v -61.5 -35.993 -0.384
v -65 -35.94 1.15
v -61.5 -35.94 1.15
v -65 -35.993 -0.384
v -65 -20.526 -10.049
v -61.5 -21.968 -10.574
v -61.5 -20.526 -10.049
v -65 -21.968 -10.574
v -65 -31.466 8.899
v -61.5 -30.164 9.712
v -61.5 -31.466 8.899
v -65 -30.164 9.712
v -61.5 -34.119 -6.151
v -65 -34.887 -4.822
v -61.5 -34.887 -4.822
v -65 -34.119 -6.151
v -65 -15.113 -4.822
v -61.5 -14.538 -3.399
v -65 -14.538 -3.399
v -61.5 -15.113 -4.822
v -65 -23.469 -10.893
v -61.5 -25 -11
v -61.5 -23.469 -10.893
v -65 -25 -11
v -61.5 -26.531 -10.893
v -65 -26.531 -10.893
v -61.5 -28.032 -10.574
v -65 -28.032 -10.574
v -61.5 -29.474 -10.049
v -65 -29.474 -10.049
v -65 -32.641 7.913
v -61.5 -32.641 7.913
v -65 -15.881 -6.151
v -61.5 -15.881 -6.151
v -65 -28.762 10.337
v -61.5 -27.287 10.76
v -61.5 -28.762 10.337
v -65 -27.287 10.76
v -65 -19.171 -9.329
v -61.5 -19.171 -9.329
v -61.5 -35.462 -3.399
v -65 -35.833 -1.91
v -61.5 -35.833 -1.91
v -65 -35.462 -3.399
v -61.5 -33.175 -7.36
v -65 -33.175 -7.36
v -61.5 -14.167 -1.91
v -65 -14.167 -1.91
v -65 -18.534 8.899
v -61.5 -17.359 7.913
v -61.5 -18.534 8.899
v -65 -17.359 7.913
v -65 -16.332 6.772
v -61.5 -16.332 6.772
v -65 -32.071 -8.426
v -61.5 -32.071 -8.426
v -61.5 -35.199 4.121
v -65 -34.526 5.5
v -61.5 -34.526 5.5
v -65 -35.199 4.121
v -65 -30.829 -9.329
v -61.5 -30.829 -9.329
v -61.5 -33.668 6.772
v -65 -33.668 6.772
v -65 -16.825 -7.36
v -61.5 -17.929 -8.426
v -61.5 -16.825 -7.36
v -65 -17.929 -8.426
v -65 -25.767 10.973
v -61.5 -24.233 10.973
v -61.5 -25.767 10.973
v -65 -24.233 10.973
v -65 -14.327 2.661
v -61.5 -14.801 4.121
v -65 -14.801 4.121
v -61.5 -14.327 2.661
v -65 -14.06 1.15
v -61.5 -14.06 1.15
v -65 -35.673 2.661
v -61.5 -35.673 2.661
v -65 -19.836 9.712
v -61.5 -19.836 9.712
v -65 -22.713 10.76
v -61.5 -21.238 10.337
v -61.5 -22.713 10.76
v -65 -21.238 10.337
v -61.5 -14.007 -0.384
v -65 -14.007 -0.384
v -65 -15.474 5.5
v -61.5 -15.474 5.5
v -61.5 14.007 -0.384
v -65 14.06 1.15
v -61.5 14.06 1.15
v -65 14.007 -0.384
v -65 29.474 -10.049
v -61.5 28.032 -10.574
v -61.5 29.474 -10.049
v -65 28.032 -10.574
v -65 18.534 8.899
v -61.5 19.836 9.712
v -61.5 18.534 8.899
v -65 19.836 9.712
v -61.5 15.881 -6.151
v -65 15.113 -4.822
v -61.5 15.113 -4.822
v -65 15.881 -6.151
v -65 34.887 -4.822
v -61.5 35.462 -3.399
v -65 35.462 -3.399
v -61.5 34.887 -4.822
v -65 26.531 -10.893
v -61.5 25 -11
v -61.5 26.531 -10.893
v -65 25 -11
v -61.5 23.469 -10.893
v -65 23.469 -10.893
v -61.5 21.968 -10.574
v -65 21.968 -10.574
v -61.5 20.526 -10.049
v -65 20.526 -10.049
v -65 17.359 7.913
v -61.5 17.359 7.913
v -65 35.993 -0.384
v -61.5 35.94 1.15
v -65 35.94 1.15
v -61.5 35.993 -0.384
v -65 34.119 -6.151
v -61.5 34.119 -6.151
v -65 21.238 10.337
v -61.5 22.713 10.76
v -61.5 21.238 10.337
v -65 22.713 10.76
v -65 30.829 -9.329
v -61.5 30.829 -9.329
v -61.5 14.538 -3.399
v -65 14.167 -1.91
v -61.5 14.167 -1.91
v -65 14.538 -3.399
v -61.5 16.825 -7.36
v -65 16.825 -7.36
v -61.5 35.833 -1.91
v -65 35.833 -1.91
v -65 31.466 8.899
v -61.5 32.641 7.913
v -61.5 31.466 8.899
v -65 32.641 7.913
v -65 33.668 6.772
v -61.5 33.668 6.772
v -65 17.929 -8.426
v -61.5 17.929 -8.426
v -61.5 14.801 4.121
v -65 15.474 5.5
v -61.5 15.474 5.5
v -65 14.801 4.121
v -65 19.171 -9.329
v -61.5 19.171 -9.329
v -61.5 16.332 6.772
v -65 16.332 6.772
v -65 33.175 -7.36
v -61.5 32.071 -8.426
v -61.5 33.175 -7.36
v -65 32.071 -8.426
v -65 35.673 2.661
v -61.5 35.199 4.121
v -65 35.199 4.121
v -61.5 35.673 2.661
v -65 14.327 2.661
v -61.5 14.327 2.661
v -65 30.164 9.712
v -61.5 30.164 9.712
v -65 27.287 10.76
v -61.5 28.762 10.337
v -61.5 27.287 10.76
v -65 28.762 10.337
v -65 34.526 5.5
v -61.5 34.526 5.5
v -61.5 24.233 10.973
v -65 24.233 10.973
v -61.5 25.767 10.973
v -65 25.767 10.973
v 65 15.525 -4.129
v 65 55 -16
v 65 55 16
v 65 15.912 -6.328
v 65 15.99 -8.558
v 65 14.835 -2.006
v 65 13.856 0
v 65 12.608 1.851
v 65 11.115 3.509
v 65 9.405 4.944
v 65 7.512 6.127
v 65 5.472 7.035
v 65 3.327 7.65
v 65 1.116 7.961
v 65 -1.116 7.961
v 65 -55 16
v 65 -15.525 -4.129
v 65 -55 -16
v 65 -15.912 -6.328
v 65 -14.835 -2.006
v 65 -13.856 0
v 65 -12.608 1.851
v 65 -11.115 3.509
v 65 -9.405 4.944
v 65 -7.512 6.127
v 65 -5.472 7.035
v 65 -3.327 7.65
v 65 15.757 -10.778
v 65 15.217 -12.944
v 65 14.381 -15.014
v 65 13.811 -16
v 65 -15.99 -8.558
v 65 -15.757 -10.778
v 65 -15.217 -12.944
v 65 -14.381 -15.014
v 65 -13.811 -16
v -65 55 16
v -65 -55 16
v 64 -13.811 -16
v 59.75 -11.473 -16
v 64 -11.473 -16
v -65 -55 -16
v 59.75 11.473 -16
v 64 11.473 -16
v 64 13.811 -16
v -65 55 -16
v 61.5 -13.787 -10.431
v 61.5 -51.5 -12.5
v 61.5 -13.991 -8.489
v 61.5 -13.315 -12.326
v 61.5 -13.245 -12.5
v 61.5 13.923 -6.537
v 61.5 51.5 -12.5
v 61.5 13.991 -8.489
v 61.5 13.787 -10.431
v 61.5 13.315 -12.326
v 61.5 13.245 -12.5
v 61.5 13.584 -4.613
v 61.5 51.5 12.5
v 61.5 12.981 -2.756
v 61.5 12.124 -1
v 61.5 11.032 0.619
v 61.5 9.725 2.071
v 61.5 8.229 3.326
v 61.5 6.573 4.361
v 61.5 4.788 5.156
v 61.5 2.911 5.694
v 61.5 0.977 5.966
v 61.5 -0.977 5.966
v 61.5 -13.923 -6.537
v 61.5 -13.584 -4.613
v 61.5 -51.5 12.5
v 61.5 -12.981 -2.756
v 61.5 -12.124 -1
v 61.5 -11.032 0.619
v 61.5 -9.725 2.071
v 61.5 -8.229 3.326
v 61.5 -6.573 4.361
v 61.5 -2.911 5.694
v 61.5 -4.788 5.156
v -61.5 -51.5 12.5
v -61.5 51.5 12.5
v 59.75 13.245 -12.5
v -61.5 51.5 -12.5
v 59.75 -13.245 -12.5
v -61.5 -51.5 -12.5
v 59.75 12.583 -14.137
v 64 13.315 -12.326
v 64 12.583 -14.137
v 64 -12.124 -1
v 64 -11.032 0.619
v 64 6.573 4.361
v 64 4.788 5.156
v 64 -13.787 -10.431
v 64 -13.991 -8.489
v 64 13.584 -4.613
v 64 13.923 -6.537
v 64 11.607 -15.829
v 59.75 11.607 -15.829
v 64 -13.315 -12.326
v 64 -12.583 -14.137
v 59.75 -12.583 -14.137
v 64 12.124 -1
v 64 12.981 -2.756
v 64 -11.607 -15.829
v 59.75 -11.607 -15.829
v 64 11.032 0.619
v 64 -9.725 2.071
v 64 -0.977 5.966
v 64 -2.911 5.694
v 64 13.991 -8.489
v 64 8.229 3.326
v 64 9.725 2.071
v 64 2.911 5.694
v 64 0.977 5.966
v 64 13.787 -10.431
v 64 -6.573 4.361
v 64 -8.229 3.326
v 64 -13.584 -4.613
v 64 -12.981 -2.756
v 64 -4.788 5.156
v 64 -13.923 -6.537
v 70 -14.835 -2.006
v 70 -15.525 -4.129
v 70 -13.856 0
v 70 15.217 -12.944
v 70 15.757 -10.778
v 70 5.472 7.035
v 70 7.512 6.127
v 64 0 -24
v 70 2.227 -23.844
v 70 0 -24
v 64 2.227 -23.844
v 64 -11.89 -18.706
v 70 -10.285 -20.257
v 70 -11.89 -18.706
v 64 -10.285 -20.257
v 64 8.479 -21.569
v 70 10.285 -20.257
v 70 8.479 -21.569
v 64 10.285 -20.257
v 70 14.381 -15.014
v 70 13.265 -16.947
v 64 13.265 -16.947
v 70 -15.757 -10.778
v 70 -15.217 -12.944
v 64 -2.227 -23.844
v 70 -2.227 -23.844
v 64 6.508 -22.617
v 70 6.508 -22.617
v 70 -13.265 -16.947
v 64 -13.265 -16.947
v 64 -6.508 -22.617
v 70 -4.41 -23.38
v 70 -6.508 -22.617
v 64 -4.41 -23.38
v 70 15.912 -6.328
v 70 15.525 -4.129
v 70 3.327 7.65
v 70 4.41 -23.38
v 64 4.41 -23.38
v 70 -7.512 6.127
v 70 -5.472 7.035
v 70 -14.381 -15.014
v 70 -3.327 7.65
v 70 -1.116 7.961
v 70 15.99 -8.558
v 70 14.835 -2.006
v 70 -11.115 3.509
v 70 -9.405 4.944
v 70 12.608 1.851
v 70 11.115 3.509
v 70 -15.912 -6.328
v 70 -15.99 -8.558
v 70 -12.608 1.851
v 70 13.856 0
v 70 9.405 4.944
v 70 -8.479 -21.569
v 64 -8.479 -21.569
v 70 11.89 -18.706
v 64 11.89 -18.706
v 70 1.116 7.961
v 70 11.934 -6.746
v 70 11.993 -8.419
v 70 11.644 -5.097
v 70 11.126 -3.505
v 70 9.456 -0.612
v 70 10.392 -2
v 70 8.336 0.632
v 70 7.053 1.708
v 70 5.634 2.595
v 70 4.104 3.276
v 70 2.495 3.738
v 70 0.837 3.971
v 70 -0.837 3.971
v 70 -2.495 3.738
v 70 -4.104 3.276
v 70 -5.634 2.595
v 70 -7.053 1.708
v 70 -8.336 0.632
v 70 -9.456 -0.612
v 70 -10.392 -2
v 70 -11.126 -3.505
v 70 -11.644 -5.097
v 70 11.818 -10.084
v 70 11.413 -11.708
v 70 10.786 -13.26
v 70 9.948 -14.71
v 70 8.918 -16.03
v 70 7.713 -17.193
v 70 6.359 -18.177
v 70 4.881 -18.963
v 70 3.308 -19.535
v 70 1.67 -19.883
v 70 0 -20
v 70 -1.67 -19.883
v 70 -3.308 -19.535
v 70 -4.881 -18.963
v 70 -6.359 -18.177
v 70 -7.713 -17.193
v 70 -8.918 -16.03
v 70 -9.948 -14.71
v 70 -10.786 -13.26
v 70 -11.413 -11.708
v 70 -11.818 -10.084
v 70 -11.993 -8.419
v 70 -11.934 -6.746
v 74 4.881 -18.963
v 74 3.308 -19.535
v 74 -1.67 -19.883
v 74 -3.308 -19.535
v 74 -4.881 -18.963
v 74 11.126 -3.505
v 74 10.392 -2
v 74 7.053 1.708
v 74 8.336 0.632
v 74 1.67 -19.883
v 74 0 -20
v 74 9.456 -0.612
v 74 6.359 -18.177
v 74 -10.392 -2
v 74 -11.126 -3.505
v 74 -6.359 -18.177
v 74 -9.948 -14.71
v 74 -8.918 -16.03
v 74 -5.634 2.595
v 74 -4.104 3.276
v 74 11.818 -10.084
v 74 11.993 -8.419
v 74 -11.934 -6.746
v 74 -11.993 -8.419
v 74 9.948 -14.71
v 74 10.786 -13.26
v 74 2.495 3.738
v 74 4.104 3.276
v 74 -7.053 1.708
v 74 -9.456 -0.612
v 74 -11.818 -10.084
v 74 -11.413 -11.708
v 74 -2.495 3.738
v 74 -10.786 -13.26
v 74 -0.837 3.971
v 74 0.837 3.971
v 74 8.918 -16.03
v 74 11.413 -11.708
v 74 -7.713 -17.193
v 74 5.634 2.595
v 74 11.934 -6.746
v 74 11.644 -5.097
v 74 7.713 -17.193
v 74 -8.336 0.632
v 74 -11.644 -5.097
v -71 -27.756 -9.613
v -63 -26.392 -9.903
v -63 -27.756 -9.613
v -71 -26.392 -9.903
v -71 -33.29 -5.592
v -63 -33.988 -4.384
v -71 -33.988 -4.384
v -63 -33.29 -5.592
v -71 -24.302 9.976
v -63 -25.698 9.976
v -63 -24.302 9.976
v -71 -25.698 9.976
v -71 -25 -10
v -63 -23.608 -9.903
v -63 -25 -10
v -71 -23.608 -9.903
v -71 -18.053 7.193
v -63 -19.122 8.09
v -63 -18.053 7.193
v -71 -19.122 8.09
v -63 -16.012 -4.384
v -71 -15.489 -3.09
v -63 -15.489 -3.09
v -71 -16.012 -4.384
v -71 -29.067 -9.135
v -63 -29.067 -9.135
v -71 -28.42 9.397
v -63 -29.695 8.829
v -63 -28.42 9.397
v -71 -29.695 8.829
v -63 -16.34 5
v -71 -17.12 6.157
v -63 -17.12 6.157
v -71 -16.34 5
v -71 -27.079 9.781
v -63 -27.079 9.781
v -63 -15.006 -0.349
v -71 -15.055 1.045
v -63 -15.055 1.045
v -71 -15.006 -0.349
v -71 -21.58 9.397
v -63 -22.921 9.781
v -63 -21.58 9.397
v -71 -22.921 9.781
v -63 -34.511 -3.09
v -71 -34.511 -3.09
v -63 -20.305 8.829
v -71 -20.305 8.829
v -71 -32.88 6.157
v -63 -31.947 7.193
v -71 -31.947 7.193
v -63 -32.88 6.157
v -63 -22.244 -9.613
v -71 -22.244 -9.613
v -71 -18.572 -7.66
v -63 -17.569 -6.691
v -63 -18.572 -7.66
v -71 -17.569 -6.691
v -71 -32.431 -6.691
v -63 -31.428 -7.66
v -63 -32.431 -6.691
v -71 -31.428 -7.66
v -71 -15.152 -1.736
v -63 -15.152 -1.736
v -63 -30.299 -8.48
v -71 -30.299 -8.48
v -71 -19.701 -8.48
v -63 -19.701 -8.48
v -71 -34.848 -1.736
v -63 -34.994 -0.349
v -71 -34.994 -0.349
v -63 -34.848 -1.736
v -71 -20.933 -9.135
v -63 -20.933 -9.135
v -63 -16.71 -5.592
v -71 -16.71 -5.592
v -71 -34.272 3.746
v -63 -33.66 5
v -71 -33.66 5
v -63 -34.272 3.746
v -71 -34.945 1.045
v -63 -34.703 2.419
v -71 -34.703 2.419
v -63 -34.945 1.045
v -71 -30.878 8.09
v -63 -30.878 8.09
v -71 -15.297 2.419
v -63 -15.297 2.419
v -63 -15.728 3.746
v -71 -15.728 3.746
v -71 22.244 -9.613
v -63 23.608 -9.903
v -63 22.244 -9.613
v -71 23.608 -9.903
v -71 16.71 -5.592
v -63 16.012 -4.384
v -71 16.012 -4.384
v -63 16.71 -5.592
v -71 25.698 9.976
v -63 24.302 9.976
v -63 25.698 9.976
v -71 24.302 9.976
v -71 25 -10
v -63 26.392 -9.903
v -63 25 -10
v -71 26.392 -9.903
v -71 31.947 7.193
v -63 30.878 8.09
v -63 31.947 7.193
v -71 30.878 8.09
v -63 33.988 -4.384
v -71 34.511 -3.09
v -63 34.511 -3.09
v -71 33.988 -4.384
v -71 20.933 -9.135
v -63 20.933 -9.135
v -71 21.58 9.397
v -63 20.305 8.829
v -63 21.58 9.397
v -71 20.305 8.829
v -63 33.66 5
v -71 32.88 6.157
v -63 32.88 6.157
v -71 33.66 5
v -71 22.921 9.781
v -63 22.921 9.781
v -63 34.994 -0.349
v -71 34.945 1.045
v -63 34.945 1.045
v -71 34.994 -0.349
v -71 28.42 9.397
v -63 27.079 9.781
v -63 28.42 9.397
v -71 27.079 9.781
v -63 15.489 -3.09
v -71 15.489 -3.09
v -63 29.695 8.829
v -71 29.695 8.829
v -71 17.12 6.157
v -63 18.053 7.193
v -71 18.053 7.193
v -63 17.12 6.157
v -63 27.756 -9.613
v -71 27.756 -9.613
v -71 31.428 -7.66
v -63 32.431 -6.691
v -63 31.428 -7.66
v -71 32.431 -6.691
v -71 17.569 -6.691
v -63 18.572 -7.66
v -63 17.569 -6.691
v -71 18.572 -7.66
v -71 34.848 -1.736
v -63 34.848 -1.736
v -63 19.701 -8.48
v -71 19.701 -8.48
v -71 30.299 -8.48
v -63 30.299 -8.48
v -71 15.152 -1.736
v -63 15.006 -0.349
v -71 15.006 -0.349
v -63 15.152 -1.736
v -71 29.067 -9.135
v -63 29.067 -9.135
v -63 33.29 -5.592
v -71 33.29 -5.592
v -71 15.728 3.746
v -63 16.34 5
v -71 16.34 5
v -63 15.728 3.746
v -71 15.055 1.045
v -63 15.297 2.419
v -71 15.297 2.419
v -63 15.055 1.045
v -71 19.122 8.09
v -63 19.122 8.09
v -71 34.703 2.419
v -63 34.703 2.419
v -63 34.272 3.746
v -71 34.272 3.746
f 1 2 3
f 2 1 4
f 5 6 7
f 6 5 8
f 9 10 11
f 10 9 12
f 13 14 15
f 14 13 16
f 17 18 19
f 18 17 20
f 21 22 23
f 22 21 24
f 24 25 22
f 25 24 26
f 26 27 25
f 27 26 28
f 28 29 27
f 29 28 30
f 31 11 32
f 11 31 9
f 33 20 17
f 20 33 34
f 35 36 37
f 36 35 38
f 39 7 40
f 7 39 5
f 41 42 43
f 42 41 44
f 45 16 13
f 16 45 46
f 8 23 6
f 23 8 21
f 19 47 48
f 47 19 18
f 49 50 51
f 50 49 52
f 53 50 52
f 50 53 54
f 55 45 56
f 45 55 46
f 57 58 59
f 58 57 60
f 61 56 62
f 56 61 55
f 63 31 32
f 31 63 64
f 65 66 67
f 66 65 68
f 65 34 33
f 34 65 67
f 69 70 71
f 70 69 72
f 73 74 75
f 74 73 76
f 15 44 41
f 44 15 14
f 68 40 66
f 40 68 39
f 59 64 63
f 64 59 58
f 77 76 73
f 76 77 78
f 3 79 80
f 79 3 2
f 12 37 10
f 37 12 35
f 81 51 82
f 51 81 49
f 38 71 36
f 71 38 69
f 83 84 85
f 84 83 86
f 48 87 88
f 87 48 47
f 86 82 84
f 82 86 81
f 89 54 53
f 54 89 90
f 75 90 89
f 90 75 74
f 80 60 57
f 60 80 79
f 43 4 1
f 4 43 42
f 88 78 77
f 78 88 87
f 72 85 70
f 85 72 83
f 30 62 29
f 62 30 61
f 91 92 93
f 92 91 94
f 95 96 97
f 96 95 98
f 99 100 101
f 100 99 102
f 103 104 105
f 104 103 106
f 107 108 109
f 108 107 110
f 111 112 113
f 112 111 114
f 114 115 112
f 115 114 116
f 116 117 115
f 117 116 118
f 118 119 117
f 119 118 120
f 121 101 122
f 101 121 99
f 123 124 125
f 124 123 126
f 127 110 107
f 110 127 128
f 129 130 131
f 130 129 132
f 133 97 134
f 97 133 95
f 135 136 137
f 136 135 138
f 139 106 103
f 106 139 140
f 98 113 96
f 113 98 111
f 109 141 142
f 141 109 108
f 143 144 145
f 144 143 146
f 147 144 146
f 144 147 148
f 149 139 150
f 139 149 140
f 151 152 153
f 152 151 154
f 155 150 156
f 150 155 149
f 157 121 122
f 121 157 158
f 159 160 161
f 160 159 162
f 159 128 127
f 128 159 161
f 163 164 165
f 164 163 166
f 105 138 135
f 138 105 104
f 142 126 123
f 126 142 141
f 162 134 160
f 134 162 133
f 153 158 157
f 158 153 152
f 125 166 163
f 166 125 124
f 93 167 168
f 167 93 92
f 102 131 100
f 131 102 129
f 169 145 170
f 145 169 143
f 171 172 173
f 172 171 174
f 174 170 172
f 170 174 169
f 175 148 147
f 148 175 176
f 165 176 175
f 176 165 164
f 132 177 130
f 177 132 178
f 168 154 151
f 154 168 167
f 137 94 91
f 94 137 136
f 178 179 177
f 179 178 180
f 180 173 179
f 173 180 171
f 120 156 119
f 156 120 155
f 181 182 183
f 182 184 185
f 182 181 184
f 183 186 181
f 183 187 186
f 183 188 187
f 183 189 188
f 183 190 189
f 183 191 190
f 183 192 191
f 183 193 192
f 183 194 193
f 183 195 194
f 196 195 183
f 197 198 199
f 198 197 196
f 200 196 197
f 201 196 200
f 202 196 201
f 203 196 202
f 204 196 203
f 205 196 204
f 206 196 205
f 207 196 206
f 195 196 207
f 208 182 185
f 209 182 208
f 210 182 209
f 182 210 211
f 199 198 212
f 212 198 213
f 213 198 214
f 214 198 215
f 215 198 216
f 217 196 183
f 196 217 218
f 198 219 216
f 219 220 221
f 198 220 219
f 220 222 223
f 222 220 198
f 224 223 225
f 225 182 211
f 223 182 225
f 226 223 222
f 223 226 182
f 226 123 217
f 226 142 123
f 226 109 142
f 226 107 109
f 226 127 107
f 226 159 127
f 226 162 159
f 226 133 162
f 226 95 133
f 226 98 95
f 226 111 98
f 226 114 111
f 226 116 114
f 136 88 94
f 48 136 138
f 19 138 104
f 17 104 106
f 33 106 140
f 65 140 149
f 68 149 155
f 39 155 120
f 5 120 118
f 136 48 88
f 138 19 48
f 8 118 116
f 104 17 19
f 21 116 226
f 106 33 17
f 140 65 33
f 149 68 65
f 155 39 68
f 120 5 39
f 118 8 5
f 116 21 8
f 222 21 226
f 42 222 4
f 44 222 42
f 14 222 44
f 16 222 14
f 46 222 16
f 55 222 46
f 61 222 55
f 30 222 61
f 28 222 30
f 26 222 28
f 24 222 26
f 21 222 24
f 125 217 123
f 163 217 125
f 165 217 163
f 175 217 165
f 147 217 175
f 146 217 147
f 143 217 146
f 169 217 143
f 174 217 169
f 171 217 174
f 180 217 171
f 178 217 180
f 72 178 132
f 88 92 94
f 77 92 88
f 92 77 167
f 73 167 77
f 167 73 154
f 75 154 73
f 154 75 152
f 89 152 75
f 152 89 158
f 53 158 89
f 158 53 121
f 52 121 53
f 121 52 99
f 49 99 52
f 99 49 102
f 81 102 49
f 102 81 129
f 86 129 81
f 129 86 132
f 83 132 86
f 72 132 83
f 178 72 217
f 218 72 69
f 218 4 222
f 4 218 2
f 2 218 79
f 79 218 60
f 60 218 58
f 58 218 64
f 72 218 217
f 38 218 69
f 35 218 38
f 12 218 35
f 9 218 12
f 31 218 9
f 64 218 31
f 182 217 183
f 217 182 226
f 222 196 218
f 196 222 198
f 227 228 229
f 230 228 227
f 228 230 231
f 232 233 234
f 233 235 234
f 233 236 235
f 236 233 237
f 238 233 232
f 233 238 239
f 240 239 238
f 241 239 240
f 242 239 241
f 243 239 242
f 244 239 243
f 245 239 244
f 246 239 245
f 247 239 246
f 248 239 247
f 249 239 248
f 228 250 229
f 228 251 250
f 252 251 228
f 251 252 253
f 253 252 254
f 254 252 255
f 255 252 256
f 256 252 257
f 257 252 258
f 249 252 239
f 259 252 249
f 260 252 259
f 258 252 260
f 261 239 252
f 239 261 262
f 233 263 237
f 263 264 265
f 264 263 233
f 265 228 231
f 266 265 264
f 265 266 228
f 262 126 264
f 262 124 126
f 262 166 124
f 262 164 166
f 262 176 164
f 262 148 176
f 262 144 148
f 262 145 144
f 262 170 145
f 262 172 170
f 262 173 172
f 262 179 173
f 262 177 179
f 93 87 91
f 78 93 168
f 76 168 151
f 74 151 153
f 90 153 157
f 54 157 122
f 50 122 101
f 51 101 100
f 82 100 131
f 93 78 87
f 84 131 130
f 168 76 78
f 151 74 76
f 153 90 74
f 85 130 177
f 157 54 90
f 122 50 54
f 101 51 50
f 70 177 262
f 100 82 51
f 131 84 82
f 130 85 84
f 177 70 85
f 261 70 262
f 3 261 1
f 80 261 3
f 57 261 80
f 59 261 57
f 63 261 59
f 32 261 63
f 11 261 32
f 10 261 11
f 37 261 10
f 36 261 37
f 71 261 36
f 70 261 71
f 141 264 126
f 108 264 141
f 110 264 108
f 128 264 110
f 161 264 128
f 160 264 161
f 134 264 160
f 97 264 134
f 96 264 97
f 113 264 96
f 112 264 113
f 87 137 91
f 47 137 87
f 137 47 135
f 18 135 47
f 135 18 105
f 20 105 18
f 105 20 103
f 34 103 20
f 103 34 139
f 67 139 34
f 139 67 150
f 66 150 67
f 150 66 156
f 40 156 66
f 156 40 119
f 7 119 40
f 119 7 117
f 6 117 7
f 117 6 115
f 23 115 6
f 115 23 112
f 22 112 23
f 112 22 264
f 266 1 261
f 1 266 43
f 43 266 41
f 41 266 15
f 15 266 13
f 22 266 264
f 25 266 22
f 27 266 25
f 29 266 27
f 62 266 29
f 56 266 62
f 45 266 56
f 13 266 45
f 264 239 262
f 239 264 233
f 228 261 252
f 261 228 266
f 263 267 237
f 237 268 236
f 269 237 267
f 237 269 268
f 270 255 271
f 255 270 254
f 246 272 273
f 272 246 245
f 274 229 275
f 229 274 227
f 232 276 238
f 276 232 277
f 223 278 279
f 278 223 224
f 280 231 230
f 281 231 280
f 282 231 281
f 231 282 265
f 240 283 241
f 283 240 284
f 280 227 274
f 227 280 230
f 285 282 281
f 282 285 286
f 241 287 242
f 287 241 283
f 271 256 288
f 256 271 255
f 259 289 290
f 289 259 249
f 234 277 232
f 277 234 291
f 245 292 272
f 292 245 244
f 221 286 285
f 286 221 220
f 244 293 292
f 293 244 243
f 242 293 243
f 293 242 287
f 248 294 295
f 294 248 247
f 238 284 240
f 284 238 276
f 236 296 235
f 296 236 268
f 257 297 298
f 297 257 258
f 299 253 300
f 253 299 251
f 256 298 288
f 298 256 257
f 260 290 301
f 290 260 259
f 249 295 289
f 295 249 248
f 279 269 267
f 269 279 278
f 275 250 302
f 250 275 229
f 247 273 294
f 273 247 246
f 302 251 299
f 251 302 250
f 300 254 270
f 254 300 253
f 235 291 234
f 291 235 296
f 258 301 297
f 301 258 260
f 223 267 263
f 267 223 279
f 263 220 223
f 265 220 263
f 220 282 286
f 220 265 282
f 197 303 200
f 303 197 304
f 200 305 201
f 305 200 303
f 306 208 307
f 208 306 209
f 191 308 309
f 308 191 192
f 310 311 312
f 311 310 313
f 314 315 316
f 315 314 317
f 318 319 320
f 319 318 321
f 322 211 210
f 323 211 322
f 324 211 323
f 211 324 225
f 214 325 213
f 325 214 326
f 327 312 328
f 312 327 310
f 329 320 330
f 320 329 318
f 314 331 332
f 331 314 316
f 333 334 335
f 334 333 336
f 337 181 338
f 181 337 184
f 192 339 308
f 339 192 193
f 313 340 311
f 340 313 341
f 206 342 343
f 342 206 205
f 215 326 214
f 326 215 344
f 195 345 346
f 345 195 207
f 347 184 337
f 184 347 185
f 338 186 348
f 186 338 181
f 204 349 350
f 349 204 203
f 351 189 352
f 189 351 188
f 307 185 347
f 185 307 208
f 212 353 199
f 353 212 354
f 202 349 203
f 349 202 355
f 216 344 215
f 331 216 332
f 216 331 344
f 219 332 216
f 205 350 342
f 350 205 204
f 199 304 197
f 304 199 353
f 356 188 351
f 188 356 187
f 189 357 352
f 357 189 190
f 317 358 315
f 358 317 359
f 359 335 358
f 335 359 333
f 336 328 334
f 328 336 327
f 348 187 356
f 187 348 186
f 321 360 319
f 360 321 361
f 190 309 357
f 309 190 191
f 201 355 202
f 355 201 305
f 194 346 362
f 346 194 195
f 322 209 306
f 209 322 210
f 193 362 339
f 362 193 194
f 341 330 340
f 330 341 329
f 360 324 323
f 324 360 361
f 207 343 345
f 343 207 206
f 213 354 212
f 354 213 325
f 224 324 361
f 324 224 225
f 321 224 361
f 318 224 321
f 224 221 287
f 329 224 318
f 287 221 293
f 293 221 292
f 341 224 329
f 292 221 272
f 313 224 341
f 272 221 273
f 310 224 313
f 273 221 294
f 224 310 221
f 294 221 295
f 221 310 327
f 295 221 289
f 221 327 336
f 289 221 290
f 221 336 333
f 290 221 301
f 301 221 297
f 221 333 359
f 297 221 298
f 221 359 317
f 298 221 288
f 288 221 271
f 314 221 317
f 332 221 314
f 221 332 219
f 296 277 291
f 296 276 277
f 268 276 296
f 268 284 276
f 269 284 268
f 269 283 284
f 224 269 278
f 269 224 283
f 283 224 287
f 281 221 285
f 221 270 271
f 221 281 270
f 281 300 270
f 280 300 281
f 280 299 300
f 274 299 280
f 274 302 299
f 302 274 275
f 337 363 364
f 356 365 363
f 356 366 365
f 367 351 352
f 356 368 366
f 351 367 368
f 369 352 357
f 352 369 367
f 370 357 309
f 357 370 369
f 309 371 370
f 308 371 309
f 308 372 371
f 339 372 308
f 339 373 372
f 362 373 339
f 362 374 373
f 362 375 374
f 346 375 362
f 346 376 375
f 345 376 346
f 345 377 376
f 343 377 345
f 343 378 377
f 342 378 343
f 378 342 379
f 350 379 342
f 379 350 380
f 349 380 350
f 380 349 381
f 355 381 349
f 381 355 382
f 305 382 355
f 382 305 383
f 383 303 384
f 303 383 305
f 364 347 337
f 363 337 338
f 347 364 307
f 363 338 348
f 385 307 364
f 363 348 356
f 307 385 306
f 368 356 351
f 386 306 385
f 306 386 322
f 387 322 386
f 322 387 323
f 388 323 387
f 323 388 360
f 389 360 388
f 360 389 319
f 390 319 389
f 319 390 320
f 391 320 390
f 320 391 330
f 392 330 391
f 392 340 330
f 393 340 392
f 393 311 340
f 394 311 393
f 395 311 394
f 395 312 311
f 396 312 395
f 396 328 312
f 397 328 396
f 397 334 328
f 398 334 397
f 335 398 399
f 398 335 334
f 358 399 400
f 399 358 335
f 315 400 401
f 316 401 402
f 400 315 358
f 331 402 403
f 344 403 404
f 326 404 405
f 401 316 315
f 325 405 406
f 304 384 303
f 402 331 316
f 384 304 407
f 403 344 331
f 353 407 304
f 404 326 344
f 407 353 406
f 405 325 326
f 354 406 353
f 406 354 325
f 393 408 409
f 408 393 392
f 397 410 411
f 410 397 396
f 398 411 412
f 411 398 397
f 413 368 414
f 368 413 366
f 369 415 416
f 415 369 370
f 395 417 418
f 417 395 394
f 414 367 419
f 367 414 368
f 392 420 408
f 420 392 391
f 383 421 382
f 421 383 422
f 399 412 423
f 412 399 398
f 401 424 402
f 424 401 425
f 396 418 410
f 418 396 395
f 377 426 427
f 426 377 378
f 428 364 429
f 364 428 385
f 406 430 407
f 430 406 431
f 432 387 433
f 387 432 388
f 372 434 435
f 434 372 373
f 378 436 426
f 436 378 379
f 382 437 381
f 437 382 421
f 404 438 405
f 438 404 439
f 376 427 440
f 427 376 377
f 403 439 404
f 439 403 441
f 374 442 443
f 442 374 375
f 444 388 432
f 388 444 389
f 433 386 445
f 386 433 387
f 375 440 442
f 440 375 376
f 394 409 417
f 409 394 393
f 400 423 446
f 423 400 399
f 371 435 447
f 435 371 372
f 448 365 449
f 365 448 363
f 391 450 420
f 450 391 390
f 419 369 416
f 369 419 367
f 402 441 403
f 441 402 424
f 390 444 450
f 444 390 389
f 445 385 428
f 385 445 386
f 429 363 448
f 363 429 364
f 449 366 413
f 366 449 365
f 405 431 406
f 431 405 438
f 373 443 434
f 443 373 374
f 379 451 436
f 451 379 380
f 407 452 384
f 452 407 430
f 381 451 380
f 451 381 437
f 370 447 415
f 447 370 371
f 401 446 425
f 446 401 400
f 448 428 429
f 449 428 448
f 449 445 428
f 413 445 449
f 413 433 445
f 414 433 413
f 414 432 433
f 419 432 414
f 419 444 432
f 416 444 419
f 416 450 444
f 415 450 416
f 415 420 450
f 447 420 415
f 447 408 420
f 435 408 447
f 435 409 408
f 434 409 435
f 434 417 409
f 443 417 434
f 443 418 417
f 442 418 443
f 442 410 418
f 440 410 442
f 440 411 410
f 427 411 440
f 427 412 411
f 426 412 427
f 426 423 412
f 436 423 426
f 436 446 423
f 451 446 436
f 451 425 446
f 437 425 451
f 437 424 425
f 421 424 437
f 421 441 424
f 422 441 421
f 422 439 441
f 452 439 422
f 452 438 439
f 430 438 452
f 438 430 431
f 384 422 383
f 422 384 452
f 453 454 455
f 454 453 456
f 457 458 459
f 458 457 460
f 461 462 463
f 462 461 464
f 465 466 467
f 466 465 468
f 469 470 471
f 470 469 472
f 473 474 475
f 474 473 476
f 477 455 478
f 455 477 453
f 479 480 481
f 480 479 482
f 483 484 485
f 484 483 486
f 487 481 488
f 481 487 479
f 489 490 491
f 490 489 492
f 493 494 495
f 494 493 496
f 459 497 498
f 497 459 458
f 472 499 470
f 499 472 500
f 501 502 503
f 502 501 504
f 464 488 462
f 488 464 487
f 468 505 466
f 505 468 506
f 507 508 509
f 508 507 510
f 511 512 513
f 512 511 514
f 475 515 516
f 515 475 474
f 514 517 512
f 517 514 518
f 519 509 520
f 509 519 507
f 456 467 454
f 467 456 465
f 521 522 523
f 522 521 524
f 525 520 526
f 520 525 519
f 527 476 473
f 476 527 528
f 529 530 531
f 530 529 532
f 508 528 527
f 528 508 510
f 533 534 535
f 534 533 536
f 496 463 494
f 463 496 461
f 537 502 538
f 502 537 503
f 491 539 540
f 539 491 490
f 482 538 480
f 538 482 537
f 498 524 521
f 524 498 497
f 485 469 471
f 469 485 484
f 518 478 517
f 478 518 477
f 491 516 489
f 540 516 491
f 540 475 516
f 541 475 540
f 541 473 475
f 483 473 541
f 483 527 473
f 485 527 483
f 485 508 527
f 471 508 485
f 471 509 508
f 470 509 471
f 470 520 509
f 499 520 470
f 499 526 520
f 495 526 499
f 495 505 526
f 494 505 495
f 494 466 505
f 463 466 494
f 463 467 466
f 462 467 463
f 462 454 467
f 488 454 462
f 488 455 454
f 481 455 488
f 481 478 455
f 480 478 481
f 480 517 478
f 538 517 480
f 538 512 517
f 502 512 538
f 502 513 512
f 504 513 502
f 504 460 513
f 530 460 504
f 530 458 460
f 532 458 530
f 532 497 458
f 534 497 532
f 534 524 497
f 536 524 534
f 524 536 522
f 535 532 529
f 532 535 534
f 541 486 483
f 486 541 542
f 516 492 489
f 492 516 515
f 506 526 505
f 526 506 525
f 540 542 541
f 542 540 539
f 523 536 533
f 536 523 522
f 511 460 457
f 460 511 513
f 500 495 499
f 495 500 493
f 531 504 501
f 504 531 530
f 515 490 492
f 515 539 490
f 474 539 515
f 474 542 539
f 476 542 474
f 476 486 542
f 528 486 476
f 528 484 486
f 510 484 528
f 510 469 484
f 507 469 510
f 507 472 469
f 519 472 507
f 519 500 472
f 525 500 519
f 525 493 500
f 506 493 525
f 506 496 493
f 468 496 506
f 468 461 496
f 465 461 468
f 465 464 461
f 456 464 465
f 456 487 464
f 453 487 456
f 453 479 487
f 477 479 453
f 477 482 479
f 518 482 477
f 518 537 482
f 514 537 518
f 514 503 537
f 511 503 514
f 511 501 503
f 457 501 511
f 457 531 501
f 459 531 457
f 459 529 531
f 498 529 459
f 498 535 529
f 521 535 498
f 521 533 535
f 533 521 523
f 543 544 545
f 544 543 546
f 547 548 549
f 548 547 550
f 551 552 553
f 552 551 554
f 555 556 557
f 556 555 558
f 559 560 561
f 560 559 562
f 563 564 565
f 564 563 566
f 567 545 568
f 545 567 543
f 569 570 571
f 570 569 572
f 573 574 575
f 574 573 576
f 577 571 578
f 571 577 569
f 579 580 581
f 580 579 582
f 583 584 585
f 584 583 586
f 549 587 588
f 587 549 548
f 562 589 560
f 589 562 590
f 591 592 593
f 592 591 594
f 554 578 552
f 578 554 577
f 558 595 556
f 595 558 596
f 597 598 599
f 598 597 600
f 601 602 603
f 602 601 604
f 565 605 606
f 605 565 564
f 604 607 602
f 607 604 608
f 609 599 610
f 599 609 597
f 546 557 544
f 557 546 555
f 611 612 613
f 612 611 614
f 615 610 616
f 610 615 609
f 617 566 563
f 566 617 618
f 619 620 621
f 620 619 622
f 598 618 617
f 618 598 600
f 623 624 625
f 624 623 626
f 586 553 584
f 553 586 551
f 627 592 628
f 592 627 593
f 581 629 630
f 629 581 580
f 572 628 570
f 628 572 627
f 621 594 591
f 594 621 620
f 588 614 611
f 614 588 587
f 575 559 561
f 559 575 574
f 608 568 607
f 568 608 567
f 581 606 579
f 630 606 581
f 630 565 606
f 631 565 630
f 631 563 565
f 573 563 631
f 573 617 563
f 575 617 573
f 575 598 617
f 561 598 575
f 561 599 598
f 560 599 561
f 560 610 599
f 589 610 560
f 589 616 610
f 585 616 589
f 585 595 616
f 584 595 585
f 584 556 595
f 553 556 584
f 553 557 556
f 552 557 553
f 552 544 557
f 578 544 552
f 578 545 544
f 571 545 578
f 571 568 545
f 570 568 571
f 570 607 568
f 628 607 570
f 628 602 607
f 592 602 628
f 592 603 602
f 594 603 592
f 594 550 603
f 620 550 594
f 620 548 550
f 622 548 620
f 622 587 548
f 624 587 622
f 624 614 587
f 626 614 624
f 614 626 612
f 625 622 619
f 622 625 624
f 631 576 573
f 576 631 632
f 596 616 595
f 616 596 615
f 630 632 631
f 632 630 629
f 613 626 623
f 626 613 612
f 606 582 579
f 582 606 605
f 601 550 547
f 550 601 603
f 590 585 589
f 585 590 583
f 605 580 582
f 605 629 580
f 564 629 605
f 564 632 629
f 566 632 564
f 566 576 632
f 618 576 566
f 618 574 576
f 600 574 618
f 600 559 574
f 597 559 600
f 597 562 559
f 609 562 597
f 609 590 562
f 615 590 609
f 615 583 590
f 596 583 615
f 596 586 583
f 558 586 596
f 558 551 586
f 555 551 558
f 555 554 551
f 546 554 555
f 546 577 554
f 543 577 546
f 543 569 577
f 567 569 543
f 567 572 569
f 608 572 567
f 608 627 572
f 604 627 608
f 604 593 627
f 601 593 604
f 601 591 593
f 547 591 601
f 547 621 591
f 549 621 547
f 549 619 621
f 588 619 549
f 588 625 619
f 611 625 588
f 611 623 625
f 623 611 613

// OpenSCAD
// ========================================================
// F-14F RETROFIT KIT - AVIONICS INTEGRATION HARDWARE
// EJECTION MONITORING INTERFACE BREAKOUT INTERLOCK PANEL
// ========================================================

$fn = 45; // Smooth render boundaries for circular ports

// --- PANEL PHYSICAL HOUSING CONSTANTS (mm) ---
box_w       = 110; // Compact envelope to mount behind the seat tracking rail
box_l       = 130; 
box_h       = 32;  
wall_thick  = 3.5; // Solid enclosure block protection layer

// --- COLOR PALETTE ---
chem_film_gold  = [0.75, 0.62, 0.20, 1.0]; // MIL-C-5541 conductive gold shield coating
rubber_grommet  = [0.15, 0.15, 0.15, 1.0]; // High-density sealing wire boots
conn_stainless  = [0.80, 0.82, 0.85, 1.0]; // Marine-grade metal circular plugs

// ========================================================
// REINFORCED COMPONENT ASSEMBLY GENERATION
// ========================================================

module ejection_interface_panel() {
    difference() {
        // Main protective housing block shell
        color(chem_film_gold) cube([box_l, box_w, box_h], center=true);
        
        // Internal storage cavity pocket for the telemetry daughterboard
        cube([box_l - (wall_thick*2), box_w - (wall_thick*2), box_h - (wall_thick*2)], center=true);
        
        // Front-panel cutouts for secondary digital monitor hookup plugs
        for (y_pos = [-25, 25]) {
            translate([-box_l/2, y_pos, 0])
                rotate([0, 90, 0]) cylinder(d=22, h=wall_thick * 3, center=true);
        }
        
        // Rear wall port hole for the heavy mechanical umbilical pass-through line
        translate([box_l/2, 0, -box_h/4])
            rotate([0, 90, 0]) cylinder(d=28, h=wall_thick * 3, center=true);
    }
    
    // --- INTEGRATED COMPONENT: Protective Wiring Grommets ---
    // Seals wire exits against cockpit moisture or condensation drops
    color(rubber_grommet) {
        translate([box_l/2 + 2, 0, -box_h/4]) rotate([0, 90, 0]) cylinder(d=32, h=6, center=true);
        translate([box_l/2 + 4, 0, -box_h/4]) rotate([0, 90, 0]) cylinder(d=24, h=10, center=true);
    }
    
    // Input Circular Sensor Coupling Sockets
    color(conn_stainless) {
        for (y_pos = [-25, 25]) {
            translate([-box_l/2 - 2, y_pos, 0])
                rotate([0, 90, 0]) cylinder(d=20, h=8, center=true);
        }
    }
}

// Execute active rendering tree module
ejection_interface_panel();
